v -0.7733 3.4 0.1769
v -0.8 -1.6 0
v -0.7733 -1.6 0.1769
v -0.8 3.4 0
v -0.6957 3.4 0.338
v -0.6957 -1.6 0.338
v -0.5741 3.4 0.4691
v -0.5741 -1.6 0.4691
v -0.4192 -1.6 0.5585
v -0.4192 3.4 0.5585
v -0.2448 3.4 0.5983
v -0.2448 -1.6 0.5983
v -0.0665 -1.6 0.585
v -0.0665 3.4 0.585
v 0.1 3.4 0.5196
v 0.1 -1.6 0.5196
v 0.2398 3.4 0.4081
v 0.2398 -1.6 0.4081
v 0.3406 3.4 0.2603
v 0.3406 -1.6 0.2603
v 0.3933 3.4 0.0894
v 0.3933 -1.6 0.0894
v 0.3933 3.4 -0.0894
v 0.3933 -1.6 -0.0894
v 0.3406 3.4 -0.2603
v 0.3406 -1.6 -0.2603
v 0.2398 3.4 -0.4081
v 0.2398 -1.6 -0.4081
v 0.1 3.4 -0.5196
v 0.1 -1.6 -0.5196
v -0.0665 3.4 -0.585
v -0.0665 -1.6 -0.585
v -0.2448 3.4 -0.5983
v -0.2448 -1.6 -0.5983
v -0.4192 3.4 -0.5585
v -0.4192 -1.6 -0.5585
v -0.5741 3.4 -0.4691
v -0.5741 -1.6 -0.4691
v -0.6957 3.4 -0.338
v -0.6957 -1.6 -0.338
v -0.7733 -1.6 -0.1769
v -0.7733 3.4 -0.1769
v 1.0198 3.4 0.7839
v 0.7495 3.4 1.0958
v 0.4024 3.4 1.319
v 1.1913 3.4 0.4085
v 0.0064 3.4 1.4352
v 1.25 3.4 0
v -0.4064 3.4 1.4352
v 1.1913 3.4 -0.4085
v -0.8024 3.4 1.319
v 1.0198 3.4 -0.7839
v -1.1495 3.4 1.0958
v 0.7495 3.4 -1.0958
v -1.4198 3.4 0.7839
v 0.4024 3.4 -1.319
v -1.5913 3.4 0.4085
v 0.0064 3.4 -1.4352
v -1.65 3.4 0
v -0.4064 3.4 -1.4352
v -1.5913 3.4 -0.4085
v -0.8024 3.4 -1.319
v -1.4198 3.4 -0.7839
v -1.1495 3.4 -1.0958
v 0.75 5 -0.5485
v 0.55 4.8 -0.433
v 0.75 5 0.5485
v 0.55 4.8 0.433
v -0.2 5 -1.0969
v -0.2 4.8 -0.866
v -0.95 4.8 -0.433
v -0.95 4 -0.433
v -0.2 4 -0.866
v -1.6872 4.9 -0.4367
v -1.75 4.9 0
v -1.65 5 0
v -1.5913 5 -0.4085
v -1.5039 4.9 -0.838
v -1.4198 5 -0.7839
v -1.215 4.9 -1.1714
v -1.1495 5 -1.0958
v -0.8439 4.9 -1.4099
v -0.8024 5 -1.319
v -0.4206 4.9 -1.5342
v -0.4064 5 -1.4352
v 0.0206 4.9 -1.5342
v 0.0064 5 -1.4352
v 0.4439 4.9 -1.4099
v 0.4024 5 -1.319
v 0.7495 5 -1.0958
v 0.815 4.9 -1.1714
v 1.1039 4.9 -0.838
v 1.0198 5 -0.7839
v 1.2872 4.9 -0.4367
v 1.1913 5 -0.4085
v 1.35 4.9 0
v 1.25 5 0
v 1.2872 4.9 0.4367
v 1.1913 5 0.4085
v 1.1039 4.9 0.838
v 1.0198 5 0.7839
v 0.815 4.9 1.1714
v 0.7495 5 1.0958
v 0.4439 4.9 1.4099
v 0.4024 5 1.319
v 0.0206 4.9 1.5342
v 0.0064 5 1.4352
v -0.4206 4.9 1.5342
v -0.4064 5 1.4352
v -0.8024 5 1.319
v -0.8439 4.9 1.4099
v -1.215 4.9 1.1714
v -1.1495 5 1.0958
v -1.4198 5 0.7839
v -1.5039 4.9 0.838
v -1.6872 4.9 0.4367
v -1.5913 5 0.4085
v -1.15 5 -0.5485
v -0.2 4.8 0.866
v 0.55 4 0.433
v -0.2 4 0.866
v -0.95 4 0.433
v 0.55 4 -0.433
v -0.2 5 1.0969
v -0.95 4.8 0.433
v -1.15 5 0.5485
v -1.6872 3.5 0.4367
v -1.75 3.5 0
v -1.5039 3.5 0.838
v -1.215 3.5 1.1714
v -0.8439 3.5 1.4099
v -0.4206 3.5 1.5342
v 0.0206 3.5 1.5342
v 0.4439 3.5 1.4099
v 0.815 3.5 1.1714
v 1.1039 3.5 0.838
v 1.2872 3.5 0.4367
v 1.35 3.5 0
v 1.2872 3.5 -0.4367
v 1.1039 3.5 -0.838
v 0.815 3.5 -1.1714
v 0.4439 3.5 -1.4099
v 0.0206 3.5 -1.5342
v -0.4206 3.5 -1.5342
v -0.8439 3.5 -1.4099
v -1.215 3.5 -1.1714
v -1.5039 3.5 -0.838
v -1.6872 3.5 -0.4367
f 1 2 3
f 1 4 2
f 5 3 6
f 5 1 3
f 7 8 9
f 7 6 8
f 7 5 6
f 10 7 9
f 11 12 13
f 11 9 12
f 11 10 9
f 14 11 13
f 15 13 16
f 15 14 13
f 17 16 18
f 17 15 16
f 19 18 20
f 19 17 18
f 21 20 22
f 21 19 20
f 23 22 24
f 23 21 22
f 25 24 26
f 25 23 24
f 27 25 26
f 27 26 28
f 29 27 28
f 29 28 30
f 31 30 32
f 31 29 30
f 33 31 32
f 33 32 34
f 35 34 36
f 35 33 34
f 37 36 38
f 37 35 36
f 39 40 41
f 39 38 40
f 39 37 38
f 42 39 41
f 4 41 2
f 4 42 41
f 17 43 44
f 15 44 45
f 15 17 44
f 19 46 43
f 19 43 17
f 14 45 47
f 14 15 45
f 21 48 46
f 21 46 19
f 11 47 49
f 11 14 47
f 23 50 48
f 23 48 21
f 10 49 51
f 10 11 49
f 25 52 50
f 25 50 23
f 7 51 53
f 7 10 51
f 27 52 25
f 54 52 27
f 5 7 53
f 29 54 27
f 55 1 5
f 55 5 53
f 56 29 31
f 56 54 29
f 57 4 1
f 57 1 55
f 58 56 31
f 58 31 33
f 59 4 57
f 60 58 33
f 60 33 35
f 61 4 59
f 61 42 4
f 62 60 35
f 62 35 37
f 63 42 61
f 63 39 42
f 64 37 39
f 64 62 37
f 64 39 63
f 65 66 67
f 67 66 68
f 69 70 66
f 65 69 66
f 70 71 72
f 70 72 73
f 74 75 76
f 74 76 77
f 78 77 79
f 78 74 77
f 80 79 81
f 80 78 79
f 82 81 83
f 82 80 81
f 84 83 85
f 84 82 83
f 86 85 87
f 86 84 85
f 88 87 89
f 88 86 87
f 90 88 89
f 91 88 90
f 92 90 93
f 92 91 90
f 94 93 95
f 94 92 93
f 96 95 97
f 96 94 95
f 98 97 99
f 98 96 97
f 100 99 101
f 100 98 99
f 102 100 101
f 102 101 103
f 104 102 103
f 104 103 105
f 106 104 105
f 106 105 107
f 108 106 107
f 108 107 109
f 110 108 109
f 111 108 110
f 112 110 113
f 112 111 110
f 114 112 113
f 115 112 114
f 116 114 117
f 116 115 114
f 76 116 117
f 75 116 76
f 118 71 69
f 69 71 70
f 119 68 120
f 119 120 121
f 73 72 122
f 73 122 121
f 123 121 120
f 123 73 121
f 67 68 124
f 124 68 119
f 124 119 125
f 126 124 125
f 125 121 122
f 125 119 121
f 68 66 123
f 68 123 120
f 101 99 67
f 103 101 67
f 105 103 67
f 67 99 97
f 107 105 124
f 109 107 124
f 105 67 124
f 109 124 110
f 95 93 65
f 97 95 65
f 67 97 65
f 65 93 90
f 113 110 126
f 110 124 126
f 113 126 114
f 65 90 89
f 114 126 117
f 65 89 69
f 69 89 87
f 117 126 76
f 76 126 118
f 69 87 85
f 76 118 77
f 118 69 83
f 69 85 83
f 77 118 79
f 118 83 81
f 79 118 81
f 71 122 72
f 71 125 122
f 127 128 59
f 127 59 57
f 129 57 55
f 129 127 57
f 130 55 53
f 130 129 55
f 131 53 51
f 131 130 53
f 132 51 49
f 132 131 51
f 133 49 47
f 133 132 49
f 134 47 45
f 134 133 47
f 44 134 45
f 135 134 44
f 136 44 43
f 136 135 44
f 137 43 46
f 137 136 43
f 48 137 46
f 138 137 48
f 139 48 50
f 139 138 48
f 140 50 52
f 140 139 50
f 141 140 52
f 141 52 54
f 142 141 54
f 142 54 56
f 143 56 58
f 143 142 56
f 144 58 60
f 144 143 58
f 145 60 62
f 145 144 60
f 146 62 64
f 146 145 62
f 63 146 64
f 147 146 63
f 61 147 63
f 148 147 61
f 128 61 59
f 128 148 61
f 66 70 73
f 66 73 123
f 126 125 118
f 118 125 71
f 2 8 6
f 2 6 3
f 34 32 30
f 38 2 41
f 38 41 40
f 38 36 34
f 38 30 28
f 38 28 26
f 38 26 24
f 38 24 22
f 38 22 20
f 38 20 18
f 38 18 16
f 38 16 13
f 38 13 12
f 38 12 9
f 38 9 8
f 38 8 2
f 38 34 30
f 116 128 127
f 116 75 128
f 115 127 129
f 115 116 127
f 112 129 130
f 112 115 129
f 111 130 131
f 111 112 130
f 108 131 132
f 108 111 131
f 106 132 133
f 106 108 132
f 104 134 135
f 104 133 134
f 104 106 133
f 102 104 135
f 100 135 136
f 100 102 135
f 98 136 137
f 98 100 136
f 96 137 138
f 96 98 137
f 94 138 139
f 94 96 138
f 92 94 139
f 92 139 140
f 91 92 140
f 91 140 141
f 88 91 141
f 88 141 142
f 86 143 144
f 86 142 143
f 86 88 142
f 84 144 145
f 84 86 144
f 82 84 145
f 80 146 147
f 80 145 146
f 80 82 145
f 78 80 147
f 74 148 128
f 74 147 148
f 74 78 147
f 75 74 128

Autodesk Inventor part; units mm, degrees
ref_plane "YZ Plane" through (0, 0, 0) normal (1, 0, 0) x (0, 1, 0)
ref_plane "XZ Plane" through (0, 0, 0) normal (0, 1, 0) x (-1, 0, 0)
ref_plane "XY Plane" through (0, 0, 0) normal (0, 0, 1) x (1, 0, 0)
sketch "スケッチ1" plane through (0, 0, 0) normal (0, 0, 1) x (1, 0, 0)
  line L0 (-1.75, 5) -> (-0.2, 5)
  line L1 (1.75, 5) -> (1.75, 3.4)
  line L2 (1.75, 3.4) -> (-1.75, 3.4)
  line L3 (-1.75, 3.4) -> (-1.75, 5)
  line L4 (-0.8, 3.4) -> (-0.2, 3.4)
  line L5 (0.8, 3.4) -> (0.8, -1.6)
  line L6 (0.8, -1.6) -> (-0.2, -1.6)
  line L7 (-0.8, -1.6) -> (-0.8, 3.4)
  line L8 (-0.2, 5) -> (-0.2, -1.6)
  line L9 (-0.2, 5) -> (1.75, 5)
  line L10 (-0.2, 3.4) -> (0.8, 3.4)
  line L11 (-0.2, -1.6) -> (-0.8, -1.6)
  point P0 (0, 0)
  dimension "d0" = 1.6
  dimension "d1" = 0.8
  dimension "d2" = 5
  dimension "d3" = 3.5
  dimension "d4" = 1.75
  dimension "d5" = 1.6
revolve "回転1" add sketch "スケッチ1" angle 360 about axis through (-0.2, 5, 0) along (0, -1, 0) contours L0 L8 L2 L3 | L8 L11 L7 L2
sketch "スケッチ2" plane through (-0.2, 5, 0) normal (0, 1, 0) x (1, 0, 0)
  line L0 (0, 0.866) -> (0.75, 0.433)
  line L1 (0.75, 0.433) -> (0.75, -0.433)
  line L2 (0.75, -0.433) -> (0, -0.866)
  line L3 (0, -0.866) -> (-0.75, -0.433)
  line L4 (-0.75, -0.433) -> (-0.75, 0.433)
  line L5 (-0.75, 0.433) -> (0, 0.866)
  point P0 (0, 0)
  dimension "d9" = 1.5
extrude "押し出し1" cut sketch "スケッチ2" against normal blind 1
chamfer "面取り1" distance 0.1 angle 45 2 edges at (1.35, 5, 0) (1.35, 3.4, 0)
chamfer "面取り2" distance 0.2 angle 45 6 edges at (0.175, 5, 0.6495) (-0.575, 5, 0.6495) (-0.95, 5, 0) (-0.575, 5, -0.6495) (0.175, 5, -0.6495) (0.55, 5, 0)
thread "ねじ2" size "M1.2x0.25" class "6g" standard "ANSI Metric M Profile" full length
equation "\"d1\" = 0.5 * d0"
equation "\"d4\" = 0.5 * d3"
properties part number "M1.6_5mm"
